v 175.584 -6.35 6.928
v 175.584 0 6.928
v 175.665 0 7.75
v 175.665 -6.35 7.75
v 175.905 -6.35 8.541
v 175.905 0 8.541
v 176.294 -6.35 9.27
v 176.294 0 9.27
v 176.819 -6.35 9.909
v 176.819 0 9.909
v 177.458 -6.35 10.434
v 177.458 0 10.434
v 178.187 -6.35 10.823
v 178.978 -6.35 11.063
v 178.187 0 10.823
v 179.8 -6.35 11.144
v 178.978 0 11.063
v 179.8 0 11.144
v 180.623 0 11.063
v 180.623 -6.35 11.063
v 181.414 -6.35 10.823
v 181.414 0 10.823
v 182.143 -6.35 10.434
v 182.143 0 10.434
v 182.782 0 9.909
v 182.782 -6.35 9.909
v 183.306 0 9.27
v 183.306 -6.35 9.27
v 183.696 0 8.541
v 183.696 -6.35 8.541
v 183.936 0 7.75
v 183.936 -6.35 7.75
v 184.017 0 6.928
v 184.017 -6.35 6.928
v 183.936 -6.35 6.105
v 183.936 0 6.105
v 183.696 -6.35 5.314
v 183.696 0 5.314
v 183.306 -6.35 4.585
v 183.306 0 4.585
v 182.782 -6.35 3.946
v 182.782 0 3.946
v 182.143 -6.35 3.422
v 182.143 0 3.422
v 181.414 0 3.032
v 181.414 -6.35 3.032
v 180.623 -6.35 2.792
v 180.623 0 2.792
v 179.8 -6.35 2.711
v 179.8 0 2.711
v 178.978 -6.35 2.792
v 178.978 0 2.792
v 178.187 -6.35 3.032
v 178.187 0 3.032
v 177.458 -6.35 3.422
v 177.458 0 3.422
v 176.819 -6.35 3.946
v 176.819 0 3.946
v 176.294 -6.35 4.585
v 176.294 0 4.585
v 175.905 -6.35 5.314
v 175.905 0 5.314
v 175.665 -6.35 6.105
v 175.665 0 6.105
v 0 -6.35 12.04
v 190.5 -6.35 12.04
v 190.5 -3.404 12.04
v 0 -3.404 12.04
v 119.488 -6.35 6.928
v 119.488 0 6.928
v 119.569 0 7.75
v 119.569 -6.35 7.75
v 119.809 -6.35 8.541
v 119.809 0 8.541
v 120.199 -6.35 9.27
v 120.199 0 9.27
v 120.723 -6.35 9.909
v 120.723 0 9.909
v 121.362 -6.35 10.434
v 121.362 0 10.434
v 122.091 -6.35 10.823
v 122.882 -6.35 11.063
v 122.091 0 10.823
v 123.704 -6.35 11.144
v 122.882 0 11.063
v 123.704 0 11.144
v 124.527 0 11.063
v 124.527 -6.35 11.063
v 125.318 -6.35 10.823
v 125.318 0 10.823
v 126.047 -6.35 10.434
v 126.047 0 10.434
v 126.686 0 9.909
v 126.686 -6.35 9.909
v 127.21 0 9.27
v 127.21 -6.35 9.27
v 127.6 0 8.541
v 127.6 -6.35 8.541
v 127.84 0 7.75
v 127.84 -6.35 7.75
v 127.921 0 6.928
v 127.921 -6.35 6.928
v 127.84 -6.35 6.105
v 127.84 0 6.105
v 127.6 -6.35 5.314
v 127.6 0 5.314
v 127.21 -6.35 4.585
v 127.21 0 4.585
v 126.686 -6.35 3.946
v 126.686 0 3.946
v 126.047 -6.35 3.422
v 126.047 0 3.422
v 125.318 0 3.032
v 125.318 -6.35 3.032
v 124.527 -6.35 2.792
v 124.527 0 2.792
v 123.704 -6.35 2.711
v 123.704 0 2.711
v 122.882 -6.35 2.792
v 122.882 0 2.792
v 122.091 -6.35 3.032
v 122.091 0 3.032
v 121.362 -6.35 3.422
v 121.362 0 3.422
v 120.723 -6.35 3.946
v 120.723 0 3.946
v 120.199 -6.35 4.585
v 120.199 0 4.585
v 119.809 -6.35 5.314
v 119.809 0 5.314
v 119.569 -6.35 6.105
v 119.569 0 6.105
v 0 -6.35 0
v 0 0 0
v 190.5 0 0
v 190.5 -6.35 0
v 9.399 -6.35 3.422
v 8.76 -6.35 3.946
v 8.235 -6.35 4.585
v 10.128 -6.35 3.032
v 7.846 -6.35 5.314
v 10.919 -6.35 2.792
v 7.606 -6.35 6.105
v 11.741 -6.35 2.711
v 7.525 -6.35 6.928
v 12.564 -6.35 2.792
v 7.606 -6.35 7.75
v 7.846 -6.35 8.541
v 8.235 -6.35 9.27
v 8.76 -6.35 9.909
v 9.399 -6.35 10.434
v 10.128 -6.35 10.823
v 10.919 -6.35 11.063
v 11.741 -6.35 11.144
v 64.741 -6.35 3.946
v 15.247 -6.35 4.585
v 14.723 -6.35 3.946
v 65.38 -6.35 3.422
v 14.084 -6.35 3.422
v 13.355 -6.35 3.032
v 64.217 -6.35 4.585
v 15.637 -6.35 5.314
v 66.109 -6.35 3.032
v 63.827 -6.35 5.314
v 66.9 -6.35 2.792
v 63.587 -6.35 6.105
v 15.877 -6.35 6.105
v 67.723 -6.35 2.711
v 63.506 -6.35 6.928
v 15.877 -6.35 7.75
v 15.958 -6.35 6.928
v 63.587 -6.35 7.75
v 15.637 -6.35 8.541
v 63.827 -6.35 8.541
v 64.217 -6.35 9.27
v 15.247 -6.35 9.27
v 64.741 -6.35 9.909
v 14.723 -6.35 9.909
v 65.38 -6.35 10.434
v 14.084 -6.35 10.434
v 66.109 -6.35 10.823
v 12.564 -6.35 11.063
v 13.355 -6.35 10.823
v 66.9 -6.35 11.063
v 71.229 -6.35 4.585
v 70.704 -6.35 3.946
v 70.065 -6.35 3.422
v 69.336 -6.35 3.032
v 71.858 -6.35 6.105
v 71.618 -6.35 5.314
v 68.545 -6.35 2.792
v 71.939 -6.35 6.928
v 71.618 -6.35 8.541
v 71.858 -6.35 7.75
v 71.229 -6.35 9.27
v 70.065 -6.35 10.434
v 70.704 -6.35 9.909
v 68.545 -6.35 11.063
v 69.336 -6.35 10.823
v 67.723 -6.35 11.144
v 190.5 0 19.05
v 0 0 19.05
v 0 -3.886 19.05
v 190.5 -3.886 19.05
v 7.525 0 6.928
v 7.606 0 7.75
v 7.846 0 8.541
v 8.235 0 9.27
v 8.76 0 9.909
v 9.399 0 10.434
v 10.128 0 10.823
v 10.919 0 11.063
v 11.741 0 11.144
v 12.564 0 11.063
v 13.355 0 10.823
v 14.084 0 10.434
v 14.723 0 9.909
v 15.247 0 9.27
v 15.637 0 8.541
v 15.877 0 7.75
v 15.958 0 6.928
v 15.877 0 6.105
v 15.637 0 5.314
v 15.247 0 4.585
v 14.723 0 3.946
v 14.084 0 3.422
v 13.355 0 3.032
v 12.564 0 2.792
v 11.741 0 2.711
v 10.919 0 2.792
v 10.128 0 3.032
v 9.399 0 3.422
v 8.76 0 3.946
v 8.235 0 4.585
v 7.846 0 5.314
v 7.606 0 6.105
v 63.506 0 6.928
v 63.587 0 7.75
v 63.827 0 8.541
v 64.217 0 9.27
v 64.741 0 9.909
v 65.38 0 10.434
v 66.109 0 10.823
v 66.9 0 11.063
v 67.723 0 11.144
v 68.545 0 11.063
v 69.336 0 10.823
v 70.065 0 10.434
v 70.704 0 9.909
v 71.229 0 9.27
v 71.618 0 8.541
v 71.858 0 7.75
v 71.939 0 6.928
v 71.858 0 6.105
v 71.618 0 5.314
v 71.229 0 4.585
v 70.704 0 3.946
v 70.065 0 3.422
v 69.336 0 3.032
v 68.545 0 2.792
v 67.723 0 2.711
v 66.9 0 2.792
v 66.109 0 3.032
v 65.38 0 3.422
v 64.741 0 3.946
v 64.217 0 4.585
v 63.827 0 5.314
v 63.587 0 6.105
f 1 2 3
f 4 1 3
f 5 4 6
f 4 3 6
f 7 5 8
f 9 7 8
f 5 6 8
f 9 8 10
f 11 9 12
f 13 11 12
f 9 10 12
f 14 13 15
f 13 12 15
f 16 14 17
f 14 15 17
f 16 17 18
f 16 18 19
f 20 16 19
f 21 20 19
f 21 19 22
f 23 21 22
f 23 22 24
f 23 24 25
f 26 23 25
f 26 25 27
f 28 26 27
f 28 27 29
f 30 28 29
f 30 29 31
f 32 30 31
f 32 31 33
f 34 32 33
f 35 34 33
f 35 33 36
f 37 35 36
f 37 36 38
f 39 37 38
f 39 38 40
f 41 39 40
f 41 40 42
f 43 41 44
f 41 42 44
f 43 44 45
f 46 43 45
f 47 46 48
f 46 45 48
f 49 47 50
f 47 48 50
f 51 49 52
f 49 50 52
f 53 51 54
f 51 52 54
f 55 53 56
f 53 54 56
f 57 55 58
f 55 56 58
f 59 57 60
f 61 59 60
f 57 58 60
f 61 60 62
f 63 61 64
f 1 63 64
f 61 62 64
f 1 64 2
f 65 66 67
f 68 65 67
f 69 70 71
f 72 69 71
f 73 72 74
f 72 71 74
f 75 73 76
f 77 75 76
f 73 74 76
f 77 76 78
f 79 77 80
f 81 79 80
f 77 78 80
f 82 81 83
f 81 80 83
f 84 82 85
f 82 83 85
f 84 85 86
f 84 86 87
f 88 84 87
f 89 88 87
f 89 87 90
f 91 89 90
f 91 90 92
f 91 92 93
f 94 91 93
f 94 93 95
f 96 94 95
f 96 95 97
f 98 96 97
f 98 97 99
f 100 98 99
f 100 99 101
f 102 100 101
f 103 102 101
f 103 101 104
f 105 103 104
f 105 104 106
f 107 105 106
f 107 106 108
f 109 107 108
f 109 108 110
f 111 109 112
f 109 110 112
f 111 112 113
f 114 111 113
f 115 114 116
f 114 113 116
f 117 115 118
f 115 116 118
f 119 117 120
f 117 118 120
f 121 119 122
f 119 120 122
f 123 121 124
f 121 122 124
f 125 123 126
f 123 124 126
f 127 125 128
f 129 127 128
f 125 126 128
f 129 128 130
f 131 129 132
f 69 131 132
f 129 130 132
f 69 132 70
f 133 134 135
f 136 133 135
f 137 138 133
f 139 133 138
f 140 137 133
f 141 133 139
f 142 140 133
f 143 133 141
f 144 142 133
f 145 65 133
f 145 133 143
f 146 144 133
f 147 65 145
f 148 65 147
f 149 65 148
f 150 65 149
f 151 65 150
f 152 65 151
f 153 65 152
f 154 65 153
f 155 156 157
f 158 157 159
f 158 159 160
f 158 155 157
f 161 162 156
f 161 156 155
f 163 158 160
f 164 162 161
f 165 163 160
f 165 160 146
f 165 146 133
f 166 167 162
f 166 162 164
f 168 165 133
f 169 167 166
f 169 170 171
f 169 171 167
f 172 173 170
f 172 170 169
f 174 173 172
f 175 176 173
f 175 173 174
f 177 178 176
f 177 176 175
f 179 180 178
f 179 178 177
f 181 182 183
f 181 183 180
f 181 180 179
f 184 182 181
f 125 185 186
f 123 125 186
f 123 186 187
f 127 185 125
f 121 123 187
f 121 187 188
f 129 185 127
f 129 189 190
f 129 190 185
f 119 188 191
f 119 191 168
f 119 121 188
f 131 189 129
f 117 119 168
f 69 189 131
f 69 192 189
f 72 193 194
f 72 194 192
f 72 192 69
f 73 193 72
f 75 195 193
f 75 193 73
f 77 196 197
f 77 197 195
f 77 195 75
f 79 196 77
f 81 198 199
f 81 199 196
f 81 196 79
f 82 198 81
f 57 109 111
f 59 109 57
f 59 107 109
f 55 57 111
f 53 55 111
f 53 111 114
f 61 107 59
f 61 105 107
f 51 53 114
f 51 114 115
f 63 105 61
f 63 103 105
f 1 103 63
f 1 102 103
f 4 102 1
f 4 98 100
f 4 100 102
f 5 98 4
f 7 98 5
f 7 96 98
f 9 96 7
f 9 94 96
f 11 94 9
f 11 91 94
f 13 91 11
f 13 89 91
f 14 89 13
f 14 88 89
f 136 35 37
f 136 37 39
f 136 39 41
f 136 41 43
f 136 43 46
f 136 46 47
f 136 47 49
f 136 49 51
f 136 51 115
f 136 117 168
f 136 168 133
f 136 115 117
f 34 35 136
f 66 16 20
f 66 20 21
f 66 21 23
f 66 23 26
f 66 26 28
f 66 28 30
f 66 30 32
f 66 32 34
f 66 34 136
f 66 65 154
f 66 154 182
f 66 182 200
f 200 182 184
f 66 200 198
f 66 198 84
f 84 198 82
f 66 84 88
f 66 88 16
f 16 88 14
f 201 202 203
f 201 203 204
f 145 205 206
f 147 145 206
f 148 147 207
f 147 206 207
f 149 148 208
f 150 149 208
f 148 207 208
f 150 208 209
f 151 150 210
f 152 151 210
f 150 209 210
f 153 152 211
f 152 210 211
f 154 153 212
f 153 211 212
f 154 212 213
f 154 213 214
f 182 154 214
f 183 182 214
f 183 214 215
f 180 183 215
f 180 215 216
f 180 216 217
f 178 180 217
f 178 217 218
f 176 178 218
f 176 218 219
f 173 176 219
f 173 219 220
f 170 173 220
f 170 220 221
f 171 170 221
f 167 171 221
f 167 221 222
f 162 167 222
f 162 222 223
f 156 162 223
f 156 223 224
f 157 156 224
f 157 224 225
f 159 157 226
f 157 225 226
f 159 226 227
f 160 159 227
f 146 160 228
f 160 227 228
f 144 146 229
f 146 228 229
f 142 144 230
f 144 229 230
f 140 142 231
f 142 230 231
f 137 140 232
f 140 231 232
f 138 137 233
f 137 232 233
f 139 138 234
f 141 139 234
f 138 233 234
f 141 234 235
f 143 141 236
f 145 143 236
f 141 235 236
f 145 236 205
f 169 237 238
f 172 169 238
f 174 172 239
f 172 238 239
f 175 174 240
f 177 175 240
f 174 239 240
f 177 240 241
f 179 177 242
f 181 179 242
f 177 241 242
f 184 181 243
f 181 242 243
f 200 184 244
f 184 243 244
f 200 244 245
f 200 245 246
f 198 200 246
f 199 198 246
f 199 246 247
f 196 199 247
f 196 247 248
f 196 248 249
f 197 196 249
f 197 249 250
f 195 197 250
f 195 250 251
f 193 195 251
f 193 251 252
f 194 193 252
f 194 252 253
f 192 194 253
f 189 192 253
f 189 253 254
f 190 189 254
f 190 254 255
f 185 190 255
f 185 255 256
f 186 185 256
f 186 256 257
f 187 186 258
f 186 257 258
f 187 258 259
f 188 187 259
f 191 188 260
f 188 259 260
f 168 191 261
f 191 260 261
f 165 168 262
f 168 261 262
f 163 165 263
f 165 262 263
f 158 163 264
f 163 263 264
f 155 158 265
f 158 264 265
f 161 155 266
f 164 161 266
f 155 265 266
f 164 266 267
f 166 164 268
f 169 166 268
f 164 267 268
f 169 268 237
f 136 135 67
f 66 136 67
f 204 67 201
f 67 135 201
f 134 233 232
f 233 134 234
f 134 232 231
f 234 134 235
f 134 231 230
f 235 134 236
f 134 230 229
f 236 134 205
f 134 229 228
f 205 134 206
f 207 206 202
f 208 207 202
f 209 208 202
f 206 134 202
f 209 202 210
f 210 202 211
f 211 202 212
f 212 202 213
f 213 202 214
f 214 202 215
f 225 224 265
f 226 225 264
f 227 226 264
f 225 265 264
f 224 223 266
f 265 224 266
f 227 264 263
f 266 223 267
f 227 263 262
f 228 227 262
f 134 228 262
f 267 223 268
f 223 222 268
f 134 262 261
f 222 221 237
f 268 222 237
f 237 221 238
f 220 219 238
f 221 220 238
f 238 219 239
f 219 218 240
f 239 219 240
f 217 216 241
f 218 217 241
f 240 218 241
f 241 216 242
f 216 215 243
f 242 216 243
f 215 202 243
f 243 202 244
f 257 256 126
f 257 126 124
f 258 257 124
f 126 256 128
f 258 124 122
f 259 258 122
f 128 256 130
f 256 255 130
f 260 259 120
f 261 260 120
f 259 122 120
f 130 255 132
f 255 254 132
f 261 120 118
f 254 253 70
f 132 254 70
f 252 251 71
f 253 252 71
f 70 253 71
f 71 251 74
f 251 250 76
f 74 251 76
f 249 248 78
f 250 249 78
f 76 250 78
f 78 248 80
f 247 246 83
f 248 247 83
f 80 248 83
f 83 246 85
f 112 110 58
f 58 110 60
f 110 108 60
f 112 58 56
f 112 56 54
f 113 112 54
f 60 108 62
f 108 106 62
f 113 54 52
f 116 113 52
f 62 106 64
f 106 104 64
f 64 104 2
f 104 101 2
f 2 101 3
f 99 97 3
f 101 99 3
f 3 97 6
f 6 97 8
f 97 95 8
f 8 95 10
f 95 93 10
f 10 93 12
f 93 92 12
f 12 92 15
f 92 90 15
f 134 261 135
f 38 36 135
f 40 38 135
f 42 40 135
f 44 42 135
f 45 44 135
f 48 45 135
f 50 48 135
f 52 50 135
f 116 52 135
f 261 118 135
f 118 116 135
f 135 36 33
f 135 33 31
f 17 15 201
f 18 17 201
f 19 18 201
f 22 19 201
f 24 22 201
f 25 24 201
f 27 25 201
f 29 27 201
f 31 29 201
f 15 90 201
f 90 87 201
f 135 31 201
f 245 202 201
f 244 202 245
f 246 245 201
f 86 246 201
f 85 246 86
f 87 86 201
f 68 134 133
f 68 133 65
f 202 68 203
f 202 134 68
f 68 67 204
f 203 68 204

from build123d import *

# Parameters (mm, degrees)
F0_W     = 190.5
F0_H     = 19.05
F1_DEPTH = 6.35
F3_D     = 8.4328
F5_DEPTH = 190.501


with BuildPart() as f1:
    # F0 (on Front) → F1 (new body)
    with BuildSketch(Plane.XZ):
        with Locations((95.25, 9.525)):
            Rectangle(F0_W, F0_H)
    extrude(amount=F1_DEPTH)

    # F3 (through all)
    with Locations(Plane.XZ.offset(6.35)):
        with Locations((11.74115, 6.92785), (67.72275, 6.92785), (123.70435, 6.92785), (179.80025, 6.92785)):
            Hole(F3_D / 2)

    # F4 (on face) → F5 (cut, through all)
    with BuildSketch(Plane.YZ.offset(190.5)):
        Polygon((-6.35, 19.05), (-6.35, 12.0396), (-3.4036, 12.0396), (-3.8862, 19.05), align=None)
    extrude(amount=-F5_DEPTH, mode=Mode.SUBTRACT)


solid = f1.part
